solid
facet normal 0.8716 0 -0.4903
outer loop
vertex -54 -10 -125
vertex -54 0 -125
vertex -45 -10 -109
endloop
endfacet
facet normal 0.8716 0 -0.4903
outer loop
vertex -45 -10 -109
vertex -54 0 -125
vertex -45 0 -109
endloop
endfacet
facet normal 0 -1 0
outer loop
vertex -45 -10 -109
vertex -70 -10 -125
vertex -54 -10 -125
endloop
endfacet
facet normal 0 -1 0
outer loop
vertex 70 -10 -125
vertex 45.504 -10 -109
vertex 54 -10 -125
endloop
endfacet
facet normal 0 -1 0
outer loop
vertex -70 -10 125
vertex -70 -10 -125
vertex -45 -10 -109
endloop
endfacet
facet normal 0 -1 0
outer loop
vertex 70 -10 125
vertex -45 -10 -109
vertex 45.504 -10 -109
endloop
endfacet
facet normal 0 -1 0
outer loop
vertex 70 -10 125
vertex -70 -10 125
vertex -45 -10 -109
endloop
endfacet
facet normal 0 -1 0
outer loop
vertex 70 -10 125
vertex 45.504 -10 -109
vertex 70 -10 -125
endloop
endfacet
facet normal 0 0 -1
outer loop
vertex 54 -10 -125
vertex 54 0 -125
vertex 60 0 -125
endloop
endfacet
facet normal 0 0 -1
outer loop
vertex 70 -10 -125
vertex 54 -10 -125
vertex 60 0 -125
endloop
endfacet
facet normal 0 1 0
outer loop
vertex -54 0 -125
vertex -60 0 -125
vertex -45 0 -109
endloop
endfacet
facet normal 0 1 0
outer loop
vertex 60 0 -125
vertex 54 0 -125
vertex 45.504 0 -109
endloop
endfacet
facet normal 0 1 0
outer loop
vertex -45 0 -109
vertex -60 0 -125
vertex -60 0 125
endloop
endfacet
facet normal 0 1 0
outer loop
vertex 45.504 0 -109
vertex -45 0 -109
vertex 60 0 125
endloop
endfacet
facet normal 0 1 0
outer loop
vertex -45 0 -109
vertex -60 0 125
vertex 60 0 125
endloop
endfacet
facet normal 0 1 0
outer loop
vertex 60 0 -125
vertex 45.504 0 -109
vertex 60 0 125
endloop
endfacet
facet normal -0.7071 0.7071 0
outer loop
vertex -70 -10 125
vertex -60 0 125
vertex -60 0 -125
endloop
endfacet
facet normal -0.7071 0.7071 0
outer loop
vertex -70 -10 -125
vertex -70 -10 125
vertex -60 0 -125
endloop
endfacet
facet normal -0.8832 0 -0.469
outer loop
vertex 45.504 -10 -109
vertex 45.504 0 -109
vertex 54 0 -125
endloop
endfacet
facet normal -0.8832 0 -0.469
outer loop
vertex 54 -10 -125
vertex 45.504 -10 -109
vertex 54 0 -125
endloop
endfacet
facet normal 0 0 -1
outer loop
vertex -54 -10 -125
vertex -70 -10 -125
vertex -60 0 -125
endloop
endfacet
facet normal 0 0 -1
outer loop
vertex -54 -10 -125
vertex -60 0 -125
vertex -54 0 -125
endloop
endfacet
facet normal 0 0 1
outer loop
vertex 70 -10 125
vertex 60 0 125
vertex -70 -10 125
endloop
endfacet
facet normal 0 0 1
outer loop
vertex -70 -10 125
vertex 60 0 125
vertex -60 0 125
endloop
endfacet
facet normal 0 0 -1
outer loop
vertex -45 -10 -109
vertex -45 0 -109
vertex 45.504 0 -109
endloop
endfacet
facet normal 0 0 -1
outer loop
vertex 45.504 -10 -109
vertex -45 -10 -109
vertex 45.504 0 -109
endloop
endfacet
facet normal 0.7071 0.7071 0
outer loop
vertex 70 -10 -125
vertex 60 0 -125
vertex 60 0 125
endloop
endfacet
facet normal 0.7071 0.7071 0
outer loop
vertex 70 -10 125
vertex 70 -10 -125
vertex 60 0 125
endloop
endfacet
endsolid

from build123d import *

# Parameters (mm, degrees)
F1_DEPTH = 10
F2_SIZE  = 9.99999


# Not quite as in the source:
# - a fillet or chamfer is up to 0.001 mm smaller than in the source, because OpenCascade refuses the exact size


with BuildPart() as f1:
    # F0 (on Front) → F1 (new body)
    with BuildSketch(Plane.XZ):
        Polygon((70, -108.8627894558), (70, 125), (-70, 125), (-70, -125), (-54, -125), (-45, -109.0002581477), (45.5037690699, -109.0002581477), (54, -125), (70, -125), align=None)
    extrude(amount=F1_DEPTH)

    # F2 (size 10 in the source; OpenCascade refuses exactly that, so slightly less here)
    f2_edges = [f1.edges().sort_by_distance(p)[0] for p in [
        (-70, 0, 0),
        (70, 0, 0),
    ]]
    chamfer(f2_edges, length=F2_SIZE)


solid = f1.part
